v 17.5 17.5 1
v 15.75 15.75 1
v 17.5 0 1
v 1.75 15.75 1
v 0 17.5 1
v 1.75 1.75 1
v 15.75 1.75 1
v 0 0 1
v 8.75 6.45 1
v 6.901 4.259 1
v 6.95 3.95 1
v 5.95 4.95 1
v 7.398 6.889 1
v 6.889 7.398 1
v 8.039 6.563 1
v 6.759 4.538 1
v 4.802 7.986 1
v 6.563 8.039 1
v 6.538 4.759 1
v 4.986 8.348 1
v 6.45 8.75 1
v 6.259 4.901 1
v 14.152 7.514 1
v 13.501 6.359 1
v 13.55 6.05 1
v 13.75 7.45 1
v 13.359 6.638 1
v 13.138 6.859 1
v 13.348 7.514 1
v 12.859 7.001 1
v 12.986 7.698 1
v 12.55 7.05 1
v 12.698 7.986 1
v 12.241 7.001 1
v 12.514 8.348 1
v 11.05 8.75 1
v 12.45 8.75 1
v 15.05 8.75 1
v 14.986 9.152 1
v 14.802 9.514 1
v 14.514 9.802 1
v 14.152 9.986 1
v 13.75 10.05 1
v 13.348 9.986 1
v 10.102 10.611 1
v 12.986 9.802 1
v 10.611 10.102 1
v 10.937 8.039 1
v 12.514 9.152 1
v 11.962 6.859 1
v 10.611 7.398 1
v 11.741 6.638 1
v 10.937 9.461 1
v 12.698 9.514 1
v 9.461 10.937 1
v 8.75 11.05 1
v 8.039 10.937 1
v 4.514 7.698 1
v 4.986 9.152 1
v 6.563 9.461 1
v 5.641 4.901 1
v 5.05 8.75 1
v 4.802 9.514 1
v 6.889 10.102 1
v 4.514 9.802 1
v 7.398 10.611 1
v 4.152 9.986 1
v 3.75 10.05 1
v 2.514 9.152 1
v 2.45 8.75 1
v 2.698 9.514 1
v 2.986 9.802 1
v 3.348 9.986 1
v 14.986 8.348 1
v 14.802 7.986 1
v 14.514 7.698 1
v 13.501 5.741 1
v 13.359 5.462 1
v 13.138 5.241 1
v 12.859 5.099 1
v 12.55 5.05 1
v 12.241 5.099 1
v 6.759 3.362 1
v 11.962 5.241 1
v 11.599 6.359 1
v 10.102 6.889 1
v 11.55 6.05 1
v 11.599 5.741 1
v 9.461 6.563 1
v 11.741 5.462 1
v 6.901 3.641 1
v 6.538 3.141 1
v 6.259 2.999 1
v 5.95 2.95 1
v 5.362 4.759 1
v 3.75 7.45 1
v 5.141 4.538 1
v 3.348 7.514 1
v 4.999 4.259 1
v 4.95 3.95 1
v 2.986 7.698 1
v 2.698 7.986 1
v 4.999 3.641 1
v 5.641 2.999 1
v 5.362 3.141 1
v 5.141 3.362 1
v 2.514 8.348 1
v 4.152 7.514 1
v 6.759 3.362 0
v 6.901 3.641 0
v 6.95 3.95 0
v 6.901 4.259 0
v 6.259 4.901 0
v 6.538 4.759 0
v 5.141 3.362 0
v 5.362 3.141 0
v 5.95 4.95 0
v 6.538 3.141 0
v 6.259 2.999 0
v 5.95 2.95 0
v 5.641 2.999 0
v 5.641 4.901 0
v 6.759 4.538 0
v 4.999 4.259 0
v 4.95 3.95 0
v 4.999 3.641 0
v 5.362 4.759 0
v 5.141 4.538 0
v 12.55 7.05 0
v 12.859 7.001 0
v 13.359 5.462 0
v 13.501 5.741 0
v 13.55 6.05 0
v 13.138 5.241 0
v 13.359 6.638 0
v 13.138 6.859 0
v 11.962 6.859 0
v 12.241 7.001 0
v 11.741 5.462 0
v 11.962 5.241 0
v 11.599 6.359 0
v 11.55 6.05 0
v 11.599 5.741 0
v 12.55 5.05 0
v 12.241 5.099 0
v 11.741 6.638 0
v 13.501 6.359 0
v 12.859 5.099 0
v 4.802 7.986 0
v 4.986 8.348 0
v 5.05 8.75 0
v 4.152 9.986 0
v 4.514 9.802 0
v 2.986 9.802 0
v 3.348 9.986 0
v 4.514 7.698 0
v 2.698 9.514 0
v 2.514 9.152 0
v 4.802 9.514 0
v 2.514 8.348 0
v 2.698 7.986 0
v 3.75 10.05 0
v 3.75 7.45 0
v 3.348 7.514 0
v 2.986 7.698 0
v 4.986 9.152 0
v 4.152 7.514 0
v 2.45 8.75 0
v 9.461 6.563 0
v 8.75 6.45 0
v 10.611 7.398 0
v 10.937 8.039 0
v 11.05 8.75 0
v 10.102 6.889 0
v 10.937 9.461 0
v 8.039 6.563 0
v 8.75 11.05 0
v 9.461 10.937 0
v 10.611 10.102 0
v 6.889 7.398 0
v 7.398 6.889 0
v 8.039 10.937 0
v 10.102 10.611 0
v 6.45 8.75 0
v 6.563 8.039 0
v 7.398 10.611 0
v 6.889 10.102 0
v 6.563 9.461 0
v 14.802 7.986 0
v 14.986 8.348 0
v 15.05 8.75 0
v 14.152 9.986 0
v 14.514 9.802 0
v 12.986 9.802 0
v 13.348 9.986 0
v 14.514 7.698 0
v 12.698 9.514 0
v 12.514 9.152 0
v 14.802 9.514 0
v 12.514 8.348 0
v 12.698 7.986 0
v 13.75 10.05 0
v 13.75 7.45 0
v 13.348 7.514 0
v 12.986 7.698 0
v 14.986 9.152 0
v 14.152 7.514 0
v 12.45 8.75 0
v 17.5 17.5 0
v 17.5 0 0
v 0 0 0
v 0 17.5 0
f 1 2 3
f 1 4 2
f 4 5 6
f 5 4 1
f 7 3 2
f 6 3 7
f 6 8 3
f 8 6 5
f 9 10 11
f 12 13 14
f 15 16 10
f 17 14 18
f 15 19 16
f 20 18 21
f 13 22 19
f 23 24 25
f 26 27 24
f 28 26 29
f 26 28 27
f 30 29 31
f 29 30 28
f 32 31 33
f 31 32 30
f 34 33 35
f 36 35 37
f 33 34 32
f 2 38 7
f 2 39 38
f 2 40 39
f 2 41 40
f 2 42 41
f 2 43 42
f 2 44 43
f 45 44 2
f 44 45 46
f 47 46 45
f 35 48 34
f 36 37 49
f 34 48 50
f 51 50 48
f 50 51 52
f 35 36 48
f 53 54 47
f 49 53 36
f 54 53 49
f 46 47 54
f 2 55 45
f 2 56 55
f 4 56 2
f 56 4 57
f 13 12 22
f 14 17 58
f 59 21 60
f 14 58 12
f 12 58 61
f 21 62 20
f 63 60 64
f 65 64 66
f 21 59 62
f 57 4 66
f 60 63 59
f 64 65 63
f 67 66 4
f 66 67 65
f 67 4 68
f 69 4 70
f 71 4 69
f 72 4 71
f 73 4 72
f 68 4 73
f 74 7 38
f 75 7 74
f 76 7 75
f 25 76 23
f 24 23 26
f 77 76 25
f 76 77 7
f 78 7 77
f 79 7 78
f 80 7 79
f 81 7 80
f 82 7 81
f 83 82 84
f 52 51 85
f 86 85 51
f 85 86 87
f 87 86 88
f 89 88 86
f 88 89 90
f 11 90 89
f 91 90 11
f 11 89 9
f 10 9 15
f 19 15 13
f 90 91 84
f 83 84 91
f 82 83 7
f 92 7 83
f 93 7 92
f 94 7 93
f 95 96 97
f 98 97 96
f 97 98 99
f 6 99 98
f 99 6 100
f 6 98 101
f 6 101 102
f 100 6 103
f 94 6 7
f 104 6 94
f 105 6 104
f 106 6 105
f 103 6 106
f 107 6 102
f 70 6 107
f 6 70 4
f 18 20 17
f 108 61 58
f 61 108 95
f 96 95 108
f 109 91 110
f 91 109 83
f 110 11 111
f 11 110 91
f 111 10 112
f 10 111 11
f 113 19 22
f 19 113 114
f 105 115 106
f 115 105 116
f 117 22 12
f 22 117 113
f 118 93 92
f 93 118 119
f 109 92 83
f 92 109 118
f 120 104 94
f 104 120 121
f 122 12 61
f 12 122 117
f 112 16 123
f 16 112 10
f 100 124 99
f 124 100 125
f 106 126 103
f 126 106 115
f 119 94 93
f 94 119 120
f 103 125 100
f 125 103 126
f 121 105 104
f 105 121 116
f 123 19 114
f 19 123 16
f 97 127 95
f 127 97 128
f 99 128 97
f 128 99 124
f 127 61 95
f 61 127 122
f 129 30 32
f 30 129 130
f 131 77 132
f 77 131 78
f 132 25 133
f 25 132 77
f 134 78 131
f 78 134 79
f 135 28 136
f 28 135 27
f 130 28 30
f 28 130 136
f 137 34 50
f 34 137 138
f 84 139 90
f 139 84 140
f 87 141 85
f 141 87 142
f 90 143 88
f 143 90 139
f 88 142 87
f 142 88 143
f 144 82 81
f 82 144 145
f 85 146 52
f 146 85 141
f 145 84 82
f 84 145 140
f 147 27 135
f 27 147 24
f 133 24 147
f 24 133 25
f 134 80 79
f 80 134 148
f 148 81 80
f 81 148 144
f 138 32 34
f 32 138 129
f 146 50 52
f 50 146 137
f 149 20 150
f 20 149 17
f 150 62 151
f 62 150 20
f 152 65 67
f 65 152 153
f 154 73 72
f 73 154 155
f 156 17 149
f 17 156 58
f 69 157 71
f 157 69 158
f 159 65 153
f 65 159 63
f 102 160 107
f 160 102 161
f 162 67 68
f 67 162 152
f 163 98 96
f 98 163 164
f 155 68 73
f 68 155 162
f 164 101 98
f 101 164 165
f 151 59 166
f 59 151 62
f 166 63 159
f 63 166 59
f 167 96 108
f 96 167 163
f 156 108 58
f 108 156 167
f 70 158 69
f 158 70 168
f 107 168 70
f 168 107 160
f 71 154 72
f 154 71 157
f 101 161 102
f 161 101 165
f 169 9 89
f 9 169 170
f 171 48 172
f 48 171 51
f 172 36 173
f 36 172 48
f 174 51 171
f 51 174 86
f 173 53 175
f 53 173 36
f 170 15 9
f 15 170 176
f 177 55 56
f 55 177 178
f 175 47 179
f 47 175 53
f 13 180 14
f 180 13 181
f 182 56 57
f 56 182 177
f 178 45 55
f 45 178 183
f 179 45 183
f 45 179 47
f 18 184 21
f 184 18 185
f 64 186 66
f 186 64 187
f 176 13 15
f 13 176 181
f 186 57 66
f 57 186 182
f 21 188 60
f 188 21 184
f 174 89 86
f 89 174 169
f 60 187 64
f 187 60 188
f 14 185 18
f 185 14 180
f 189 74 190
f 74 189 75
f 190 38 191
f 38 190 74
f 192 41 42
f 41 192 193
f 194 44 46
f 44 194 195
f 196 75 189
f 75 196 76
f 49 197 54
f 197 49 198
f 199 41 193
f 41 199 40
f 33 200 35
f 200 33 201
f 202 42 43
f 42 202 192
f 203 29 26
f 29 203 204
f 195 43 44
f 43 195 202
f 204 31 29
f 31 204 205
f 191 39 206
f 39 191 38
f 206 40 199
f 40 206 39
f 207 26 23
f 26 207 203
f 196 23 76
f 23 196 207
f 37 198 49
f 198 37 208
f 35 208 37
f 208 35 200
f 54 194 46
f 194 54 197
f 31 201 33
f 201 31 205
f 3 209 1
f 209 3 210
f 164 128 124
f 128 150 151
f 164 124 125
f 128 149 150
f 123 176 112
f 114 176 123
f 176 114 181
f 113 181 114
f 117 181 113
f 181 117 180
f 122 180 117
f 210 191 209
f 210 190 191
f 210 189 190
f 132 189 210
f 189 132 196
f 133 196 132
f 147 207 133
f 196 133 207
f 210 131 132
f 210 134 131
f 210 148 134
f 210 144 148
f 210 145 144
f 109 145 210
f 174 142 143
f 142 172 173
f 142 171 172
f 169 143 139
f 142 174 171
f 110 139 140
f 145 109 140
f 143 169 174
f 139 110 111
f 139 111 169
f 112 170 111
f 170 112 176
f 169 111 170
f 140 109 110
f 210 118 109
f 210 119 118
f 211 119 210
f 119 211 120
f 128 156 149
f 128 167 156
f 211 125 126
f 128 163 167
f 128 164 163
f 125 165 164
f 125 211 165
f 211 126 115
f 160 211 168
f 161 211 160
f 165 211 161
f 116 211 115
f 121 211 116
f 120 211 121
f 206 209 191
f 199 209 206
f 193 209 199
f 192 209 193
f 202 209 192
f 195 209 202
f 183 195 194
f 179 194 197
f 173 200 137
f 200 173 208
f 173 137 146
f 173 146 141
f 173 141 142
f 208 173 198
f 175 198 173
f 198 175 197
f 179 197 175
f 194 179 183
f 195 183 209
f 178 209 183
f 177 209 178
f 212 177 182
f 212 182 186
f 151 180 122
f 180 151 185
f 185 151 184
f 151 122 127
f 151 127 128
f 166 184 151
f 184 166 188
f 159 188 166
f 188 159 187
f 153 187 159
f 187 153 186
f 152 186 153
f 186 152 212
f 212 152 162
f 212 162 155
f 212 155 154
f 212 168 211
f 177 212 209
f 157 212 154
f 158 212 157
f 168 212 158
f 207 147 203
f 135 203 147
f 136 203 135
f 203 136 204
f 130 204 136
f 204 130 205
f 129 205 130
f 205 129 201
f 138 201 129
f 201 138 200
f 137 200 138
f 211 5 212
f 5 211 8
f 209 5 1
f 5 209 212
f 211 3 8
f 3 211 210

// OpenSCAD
$fn=20;

// positive / key like, used for boolean operation

length 	= 14;
width 	= 14;
height  = 1;

pin_diam = 2;
peg_diam = 2.6;

pin_height = 4.2;

center_pin_diam = 4.6;


difference()
{
	cube(size=[length*1.25,width*1.25,height], center=false);
	rotate([180,0,0])
	translate([length*0.125,-width*1.125,-2*height])
	cherry_key();
}

module cherry_key()
{
cube(size=[length,width,height], center=false);

translate([4.2,width-2.2,0])
// contact pin 1
cylinder(h=pin_height, r1 = pin_diam/2, r2 = pin_diam/2, center=false);

translate([length-3.2,width-4.3,0])
// contact pin 2
cylinder(h=pin_height, r1 = pin_diam/2, r2 = pin_diam/2, center=false);


translate([2,width/2,0])
// left pin
cylinder(h=pin_height, r1 = peg_diam/2, r2 = peg_diam/2, center=false);

translate([length/2,width/2,0])
// Center pin
cylinder(h=pin_height, r1 = center_pin_diam/2, r2 = center_pin_diam/2, center=false);

translate([length-2,width/2,0])
// right pin
cylinder(h=pin_height, r1 = peg_diam/2, r2 = peg_diam/2, center=false);
}
